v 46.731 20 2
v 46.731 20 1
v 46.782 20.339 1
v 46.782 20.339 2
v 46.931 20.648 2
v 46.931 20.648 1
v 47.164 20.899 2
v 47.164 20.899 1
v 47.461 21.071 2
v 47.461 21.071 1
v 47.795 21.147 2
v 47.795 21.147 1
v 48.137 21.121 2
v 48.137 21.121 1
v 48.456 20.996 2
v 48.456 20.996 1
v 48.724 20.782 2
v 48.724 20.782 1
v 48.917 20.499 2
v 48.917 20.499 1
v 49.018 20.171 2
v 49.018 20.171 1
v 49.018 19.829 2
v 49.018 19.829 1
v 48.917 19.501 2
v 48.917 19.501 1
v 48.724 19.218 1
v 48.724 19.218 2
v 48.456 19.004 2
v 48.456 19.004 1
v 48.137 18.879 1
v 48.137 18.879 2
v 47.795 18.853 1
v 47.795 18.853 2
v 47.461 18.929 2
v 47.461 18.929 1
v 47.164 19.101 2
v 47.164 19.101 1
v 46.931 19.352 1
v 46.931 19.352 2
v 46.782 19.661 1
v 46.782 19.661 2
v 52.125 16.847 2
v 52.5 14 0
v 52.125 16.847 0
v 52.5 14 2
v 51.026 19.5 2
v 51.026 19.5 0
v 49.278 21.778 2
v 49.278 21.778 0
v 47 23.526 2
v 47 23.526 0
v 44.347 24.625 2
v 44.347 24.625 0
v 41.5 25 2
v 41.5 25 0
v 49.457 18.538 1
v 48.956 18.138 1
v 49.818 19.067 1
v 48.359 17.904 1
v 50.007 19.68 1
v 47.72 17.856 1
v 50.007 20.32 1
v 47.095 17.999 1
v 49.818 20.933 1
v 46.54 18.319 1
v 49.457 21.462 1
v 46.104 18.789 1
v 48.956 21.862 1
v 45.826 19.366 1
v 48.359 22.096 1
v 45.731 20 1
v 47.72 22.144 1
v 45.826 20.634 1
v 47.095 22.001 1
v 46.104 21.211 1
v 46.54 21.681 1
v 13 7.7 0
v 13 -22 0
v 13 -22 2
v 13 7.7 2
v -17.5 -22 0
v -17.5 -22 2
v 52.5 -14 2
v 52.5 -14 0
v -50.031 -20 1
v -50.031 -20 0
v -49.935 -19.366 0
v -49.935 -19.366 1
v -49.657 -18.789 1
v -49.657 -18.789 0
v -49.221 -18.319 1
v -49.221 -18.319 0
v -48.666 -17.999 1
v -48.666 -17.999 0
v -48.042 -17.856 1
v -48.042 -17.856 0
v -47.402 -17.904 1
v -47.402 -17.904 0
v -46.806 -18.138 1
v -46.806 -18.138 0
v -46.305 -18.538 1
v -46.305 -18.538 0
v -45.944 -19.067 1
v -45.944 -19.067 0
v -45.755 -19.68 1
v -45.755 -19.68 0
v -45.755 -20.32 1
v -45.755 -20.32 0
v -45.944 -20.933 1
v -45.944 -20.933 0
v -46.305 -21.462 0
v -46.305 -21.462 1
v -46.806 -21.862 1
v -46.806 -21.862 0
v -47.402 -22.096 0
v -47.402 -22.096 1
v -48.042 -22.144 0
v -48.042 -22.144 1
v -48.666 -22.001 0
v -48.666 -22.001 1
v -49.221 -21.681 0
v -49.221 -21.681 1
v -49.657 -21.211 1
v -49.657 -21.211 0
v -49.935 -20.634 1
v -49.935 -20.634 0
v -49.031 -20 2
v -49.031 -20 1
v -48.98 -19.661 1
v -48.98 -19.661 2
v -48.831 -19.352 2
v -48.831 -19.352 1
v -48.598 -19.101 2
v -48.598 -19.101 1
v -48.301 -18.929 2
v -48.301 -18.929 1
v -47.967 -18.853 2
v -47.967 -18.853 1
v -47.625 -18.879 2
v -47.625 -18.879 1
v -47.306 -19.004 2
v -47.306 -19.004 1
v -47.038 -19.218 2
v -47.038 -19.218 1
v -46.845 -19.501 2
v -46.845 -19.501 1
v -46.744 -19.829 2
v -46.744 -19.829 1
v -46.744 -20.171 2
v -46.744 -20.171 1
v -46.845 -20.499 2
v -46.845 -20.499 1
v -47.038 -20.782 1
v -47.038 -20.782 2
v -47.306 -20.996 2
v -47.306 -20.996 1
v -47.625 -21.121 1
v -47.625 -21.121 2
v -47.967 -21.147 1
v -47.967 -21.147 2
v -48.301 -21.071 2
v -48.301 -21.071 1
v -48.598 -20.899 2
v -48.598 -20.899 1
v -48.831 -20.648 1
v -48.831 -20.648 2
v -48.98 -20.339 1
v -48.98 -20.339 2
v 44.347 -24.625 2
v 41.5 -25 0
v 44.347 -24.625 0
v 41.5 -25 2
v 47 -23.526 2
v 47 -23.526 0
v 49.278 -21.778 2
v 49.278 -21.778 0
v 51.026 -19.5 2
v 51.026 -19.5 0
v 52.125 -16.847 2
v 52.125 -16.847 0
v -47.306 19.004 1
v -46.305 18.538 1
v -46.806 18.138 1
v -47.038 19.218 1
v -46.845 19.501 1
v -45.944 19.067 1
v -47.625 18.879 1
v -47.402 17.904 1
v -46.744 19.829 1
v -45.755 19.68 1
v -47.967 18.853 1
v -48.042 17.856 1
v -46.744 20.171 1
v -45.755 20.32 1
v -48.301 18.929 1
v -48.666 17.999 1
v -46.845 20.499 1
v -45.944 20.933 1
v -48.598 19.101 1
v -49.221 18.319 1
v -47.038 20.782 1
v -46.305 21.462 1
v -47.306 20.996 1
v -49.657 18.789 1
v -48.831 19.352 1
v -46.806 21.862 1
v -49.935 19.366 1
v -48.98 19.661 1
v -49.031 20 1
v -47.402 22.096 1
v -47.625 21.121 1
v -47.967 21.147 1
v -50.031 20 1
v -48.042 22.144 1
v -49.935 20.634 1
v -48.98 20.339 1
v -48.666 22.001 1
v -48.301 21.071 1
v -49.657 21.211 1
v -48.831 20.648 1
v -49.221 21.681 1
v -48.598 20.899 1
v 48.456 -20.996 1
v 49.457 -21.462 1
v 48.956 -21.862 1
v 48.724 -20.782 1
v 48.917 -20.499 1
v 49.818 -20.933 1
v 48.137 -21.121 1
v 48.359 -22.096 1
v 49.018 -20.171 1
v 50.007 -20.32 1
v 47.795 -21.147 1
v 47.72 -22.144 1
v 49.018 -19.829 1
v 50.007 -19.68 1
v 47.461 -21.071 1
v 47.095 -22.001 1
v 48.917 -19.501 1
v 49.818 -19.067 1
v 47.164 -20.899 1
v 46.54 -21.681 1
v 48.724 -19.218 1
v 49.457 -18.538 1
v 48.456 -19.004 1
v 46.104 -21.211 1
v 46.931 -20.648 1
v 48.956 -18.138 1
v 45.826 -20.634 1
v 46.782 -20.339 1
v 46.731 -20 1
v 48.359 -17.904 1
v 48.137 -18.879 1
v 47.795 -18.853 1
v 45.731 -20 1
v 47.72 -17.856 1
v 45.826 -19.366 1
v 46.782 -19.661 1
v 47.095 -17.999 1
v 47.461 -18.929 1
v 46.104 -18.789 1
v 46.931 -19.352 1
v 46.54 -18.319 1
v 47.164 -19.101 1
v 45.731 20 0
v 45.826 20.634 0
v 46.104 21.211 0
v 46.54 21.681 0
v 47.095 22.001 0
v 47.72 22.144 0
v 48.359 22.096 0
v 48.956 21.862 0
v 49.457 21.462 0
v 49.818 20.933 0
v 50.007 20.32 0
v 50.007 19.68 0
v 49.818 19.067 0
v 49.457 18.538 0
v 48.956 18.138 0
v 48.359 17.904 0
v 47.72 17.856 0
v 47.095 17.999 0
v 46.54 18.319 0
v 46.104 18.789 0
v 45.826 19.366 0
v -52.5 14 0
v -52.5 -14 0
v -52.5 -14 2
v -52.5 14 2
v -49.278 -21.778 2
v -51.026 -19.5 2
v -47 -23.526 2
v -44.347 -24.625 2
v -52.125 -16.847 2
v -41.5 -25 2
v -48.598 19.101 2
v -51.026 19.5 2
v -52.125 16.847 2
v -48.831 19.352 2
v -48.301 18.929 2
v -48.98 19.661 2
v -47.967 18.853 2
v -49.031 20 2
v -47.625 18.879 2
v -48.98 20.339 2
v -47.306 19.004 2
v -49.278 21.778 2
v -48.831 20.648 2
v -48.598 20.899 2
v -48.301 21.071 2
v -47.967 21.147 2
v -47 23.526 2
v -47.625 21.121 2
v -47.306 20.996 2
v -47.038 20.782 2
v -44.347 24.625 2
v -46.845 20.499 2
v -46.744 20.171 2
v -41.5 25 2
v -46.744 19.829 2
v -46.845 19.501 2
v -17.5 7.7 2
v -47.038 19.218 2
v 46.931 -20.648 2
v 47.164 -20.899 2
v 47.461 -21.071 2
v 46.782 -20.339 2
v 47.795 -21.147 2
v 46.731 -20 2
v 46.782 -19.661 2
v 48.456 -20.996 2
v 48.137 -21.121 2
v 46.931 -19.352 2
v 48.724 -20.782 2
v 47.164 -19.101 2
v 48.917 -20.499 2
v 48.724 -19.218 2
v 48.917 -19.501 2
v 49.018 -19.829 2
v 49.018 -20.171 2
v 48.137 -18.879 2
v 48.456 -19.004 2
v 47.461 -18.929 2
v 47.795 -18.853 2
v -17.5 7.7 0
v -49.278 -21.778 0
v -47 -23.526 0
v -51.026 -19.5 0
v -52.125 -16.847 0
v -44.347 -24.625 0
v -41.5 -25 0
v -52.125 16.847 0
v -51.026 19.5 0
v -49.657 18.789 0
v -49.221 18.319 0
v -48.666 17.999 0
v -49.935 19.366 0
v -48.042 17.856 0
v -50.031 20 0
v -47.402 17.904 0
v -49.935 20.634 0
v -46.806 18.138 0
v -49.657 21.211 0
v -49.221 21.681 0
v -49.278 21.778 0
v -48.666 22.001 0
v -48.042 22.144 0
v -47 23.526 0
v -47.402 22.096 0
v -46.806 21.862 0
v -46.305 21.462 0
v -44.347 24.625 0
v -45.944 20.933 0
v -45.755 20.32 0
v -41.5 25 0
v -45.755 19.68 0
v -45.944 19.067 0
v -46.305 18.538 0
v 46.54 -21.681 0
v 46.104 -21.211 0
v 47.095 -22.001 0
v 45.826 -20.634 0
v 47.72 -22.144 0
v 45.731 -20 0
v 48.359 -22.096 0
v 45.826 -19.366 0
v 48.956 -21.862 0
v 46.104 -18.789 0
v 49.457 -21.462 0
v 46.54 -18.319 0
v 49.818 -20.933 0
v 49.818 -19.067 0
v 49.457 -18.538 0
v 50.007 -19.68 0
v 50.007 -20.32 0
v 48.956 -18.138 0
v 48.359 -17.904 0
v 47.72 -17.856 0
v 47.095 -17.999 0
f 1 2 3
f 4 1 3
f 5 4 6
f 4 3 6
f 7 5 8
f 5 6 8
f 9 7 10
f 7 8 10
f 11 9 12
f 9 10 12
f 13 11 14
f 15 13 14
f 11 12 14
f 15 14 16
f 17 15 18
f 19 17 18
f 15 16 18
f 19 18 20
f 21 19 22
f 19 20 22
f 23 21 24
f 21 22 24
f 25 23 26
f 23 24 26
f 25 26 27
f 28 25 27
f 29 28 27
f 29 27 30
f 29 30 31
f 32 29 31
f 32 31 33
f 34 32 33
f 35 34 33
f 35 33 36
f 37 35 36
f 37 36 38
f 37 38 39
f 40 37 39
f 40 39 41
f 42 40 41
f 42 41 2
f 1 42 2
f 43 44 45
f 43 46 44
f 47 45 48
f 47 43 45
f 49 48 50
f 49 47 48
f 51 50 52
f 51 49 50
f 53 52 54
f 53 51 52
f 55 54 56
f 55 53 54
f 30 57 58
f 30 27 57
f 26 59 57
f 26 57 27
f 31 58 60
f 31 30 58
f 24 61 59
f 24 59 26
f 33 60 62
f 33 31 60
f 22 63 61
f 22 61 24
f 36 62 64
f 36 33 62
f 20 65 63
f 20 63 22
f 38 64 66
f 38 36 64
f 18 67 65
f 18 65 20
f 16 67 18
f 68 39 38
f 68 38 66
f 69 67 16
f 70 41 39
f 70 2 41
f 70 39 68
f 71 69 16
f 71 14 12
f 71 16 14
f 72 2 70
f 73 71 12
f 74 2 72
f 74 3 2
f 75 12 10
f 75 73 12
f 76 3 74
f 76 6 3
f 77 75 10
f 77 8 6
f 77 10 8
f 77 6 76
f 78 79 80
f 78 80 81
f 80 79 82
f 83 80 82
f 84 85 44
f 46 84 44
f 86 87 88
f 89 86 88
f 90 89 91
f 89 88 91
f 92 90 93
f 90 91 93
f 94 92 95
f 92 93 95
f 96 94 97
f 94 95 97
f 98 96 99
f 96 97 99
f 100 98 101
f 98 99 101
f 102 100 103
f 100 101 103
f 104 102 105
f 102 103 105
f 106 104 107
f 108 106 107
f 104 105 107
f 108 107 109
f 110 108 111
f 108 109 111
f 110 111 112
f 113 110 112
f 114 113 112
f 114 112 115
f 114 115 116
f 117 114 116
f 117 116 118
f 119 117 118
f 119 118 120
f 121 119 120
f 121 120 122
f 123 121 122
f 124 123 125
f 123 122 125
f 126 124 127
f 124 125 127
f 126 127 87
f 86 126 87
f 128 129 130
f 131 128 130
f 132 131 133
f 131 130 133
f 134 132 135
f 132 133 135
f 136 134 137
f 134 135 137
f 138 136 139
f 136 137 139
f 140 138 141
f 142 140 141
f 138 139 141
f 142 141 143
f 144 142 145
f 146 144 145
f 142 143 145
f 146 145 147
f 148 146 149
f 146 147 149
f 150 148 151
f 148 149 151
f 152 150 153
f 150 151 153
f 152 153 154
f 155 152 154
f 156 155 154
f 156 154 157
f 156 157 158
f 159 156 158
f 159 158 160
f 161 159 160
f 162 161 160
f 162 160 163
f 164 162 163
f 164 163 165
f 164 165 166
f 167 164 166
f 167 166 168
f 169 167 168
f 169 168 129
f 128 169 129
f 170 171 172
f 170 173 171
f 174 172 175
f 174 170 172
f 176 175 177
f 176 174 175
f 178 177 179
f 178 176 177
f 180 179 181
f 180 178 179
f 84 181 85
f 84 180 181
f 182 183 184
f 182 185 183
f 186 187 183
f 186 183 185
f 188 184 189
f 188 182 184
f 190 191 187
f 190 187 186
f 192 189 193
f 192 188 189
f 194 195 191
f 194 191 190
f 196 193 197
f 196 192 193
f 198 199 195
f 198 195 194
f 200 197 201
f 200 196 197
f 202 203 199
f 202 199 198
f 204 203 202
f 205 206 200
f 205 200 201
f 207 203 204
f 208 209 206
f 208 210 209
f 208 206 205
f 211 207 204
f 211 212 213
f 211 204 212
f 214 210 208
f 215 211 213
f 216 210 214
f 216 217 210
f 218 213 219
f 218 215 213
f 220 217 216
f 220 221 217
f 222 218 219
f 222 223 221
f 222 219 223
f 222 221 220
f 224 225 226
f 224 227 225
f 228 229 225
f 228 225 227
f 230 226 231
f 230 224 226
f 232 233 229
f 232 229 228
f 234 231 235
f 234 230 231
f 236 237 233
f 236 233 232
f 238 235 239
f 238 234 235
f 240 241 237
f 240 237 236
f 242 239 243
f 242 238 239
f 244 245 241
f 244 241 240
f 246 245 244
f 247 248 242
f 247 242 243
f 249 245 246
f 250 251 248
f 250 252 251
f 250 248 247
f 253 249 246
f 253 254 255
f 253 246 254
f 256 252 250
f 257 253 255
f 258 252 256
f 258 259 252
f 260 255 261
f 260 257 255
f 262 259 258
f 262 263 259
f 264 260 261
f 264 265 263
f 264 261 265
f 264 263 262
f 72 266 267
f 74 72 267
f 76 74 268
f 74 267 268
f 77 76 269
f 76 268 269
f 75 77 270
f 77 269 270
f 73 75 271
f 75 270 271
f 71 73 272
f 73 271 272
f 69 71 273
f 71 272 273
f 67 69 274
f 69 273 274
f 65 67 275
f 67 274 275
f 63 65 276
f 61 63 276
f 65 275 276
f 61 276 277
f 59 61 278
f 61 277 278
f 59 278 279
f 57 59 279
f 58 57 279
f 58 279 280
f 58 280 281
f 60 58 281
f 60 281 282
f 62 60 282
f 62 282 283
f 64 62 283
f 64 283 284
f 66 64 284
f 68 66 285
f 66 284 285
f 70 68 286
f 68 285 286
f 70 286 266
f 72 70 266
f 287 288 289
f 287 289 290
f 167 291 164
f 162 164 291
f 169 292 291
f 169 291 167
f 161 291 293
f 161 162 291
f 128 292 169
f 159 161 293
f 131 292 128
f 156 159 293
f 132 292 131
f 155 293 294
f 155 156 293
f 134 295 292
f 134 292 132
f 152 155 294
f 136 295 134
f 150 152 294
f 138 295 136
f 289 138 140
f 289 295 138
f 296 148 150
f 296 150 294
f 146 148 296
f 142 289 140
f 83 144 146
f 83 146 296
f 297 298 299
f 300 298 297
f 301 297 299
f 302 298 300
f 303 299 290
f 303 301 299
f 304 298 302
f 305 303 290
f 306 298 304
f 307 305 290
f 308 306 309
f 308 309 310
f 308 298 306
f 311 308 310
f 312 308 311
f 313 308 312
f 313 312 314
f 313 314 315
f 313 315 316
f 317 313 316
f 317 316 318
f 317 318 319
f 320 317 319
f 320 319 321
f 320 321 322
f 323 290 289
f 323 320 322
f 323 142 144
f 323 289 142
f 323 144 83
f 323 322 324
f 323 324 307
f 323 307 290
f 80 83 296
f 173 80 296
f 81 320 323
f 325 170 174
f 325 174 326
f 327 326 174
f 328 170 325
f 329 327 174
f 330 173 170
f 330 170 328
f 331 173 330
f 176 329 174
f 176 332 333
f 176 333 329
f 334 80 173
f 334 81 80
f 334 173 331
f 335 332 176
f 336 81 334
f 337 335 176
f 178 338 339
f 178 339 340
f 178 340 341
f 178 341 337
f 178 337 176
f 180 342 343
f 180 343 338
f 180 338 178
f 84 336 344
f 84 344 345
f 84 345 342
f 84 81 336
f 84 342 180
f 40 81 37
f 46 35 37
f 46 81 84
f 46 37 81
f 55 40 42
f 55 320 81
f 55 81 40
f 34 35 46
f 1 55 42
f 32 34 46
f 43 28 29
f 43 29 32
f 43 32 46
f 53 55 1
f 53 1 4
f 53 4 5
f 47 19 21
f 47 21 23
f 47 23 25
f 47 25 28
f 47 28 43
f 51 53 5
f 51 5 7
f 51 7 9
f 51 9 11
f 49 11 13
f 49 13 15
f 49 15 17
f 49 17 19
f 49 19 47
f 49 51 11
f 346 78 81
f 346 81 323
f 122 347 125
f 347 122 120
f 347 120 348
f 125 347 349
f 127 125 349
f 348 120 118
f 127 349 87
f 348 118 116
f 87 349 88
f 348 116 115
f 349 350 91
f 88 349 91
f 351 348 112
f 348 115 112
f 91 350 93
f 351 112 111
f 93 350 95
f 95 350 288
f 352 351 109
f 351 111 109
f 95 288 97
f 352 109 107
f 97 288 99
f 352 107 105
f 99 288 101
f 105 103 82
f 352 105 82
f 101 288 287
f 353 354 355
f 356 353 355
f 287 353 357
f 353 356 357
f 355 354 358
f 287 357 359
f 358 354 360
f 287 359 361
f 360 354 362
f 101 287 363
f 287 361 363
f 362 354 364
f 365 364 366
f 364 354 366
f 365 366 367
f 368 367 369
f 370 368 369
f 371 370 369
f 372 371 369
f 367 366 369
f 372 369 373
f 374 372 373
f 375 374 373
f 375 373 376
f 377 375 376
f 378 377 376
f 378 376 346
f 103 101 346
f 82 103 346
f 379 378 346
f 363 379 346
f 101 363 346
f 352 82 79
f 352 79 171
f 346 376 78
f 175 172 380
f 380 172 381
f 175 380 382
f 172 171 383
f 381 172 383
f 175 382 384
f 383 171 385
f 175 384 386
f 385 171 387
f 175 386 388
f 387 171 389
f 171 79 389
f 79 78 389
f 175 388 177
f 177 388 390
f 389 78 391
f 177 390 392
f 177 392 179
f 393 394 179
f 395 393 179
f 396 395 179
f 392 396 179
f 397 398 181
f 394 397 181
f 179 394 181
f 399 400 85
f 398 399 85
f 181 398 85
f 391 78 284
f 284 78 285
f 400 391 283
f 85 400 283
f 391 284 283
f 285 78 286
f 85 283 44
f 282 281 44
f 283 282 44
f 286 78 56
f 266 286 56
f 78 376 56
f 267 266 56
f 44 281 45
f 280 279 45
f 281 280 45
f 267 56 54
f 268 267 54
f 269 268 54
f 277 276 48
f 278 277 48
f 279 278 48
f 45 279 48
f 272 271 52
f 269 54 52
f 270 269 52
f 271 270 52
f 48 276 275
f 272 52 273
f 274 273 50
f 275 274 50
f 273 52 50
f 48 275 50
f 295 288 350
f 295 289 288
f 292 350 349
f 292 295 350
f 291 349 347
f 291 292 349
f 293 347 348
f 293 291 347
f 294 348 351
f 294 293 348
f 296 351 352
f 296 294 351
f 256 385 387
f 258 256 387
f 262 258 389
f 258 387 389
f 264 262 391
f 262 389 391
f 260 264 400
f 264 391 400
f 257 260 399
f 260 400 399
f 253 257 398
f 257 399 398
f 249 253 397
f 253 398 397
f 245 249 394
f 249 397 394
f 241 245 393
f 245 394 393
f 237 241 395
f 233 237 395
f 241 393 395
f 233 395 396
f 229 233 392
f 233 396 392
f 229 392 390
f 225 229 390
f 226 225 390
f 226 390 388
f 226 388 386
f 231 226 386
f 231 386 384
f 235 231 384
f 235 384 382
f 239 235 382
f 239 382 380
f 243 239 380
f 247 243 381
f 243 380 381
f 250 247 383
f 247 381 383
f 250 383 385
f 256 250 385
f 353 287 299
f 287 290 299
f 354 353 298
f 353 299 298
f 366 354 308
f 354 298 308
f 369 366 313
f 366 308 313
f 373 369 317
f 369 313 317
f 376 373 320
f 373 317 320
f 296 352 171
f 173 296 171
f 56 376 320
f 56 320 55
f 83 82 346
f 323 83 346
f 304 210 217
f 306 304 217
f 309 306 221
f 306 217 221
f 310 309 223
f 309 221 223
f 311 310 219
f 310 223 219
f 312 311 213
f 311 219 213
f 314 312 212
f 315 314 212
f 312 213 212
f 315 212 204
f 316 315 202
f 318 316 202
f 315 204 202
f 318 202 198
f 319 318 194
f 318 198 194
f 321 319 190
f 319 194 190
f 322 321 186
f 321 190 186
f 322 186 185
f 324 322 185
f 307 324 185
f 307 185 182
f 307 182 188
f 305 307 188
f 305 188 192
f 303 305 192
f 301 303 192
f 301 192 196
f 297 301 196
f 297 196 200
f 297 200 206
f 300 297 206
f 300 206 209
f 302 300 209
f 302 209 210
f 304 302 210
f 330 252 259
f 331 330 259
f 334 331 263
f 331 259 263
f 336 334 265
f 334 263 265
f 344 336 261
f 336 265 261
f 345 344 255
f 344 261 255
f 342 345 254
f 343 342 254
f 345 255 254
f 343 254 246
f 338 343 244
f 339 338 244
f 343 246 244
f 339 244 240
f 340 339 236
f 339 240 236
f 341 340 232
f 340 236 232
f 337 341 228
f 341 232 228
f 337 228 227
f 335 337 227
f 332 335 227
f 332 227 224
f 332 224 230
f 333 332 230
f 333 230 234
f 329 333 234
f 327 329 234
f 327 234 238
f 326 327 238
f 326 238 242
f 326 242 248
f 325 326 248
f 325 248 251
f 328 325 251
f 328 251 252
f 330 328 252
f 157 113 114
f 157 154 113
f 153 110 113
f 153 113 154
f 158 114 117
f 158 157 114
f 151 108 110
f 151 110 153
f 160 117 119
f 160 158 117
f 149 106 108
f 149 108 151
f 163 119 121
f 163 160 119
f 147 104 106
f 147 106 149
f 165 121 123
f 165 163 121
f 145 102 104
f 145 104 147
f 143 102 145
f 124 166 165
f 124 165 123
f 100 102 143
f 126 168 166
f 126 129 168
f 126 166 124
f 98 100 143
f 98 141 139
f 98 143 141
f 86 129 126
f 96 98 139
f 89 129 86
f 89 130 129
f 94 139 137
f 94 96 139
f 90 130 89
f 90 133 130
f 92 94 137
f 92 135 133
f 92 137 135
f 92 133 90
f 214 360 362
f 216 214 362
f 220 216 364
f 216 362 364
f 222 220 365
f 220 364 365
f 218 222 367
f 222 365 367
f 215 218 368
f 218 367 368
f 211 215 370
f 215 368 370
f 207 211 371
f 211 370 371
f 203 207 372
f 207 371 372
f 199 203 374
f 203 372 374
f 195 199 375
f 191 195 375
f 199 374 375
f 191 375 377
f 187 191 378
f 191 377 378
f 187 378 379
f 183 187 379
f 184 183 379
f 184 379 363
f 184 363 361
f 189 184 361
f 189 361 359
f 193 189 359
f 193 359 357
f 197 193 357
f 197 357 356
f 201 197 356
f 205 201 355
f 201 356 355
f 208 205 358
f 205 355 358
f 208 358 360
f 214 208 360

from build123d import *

# Parameters (mm, degrees)
SKETCH_1_W          = 105
SKETCH_1_H          = 50
EXTRUDE_1_DEPTH     = 2
FILLET_1_R          = 11
SKETCH_3_R          = 2.15
CUT_EXTRUDE_1_DEPTH = 1
CUT_EXTRUDE_2_REACH = 60.157
SKETCH_4_R          = 1.15
CUT_EXTRUDE_3_REACH = 60.183
SKETCH_5_W          = 30.5
SKETCH_5_H          = 29.7


with BuildPart() as part:
    # 草图1 → 凸台-拉伸1 (new body)
    with BuildSketch(Plane.XY):
        Rectangle(SKETCH_1_W, SKETCH_1_H)
    extrude(amount=EXTRUDE_1_DEPTH)

    # 圆角1
    fillet_1_edges = [part.edges().sort_by_distance(p)[0] for p in [
        (52.5, -25, 1),
        (-52.5, -25, 1),
        (-52.5, 25, 1),
        (52.5, 25, 1),
    ]]
    fillet(fillet_1_edges, radius=FILLET_1_R)

    # 草图3 → 切除-拉伸1 (cut)
    with BuildSketch(Plane(origin=(0, 0, 0), x_dir=(-1, 0, 0), z_dir=(0, 0, -1))):
        with Locations((47.88083152, -20)):
            Circle(SKETCH_3_R)
        with Locations((47.88083152, 20)):
            Circle(SKETCH_3_R)
        with Locations((-47.88083152, 20)):
            Circle(SKETCH_3_R)
        with Locations((-47.88083152, -20)):
            Circle(SKETCH_3_R)
    extrude(amount=-CUT_EXTRUDE_1_DEPTH, mode=Mode.SUBTRACT)

    # 草图4 → 切除-拉伸2 (cut, up to next)
    with BuildSketch(Plane(origin=(0, 0, 1), x_dir=(-1, 0, 0), z_dir=(0, 0, -1)), mode=Mode.PRIVATE) as cut_extrude_2_sk1:
        with Locations((47.88083152, -20)):
            Circle(SKETCH_4_R)
    cut_extrude_2_tool1 = extrude(cut_extrude_2_sk1.sketch, amount=-CUT_EXTRUDE_2_REACH, mode=Mode.PRIVATE) & part.part
    # 草图4 → 切除-拉伸2 (cut, up to next)
    with BuildSketch(Plane(origin=(0, 0, 1), x_dir=(-1, 0, 0), z_dir=(0, 0, -1)), mode=Mode.PRIVATE) as cut_extrude_2_sk2:
        with Locations((-47.88083152, -20)):
            Circle(SKETCH_4_R)
    cut_extrude_2_tool2 = extrude(cut_extrude_2_sk2.sketch, amount=-CUT_EXTRUDE_2_REACH, mode=Mode.PRIVATE) & part.part
    # 草图4 → 切除-拉伸2 (cut, up to next)
    with BuildSketch(Plane(origin=(0, 0, 1), x_dir=(-1, 0, 0), z_dir=(0, 0, -1)), mode=Mode.PRIVATE) as cut_extrude_2_sk3:
        with Locations((47.88083152, 20)):
            Circle(SKETCH_4_R)
    cut_extrude_2_tool3 = extrude(cut_extrude_2_sk3.sketch, amount=-CUT_EXTRUDE_2_REACH, mode=Mode.PRIVATE) & part.part
    # 草图4 → 切除-拉伸2 (cut, up to next)
    with BuildSketch(Plane(origin=(0, 0, 1), x_dir=(-1, 0, 0), z_dir=(0, 0, -1)), mode=Mode.PRIVATE) as cut_extrude_2_sk4:
        with Locations((-47.88083152, 20)):
            Circle(SKETCH_4_R)
    cut_extrude_2_tool4 = extrude(cut_extrude_2_sk4.sketch, amount=-CUT_EXTRUDE_2_REACH, mode=Mode.PRIVATE) & part.part
    add(cut_extrude_2_tool1.solids().sort_by_distance((-47.880832, -20, 1))[0], mode=Mode.SUBTRACT)
    add(cut_extrude_2_tool2.solids().sort_by_distance((47.880832, -20, 1))[0], mode=Mode.SUBTRACT)
    add(cut_extrude_2_tool3.solids().sort_by_distance((-47.880832, 20, 1))[0], mode=Mode.SUBTRACT)
    add(cut_extrude_2_tool4.solids().sort_by_distance((47.880832, 20, 1))[0], mode=Mode.SUBTRACT)

    # 草图5 → 切除-拉伸3 (cut, up to next)
    with BuildSketch(Plane(origin=(0, 0, 0), x_dir=(-1, 0, 0), z_dir=(0, 0, -1)), mode=Mode.PRIVATE) as cut_extrude_3_sk1:
        with Locations((2.25, -7.15)):
            Rectangle(SKETCH_5_W, SKETCH_5_H)
    cut_extrude_3_tool1 = extrude(cut_extrude_3_sk1.sketch, amount=-CUT_EXTRUDE_3_REACH, mode=Mode.PRIVATE) & part.part
    add(cut_extrude_3_tool1.solids().sort_by_distance((-2.25, -7.15, 0))[0], mode=Mode.SUBTRACT)


solid = part.part
